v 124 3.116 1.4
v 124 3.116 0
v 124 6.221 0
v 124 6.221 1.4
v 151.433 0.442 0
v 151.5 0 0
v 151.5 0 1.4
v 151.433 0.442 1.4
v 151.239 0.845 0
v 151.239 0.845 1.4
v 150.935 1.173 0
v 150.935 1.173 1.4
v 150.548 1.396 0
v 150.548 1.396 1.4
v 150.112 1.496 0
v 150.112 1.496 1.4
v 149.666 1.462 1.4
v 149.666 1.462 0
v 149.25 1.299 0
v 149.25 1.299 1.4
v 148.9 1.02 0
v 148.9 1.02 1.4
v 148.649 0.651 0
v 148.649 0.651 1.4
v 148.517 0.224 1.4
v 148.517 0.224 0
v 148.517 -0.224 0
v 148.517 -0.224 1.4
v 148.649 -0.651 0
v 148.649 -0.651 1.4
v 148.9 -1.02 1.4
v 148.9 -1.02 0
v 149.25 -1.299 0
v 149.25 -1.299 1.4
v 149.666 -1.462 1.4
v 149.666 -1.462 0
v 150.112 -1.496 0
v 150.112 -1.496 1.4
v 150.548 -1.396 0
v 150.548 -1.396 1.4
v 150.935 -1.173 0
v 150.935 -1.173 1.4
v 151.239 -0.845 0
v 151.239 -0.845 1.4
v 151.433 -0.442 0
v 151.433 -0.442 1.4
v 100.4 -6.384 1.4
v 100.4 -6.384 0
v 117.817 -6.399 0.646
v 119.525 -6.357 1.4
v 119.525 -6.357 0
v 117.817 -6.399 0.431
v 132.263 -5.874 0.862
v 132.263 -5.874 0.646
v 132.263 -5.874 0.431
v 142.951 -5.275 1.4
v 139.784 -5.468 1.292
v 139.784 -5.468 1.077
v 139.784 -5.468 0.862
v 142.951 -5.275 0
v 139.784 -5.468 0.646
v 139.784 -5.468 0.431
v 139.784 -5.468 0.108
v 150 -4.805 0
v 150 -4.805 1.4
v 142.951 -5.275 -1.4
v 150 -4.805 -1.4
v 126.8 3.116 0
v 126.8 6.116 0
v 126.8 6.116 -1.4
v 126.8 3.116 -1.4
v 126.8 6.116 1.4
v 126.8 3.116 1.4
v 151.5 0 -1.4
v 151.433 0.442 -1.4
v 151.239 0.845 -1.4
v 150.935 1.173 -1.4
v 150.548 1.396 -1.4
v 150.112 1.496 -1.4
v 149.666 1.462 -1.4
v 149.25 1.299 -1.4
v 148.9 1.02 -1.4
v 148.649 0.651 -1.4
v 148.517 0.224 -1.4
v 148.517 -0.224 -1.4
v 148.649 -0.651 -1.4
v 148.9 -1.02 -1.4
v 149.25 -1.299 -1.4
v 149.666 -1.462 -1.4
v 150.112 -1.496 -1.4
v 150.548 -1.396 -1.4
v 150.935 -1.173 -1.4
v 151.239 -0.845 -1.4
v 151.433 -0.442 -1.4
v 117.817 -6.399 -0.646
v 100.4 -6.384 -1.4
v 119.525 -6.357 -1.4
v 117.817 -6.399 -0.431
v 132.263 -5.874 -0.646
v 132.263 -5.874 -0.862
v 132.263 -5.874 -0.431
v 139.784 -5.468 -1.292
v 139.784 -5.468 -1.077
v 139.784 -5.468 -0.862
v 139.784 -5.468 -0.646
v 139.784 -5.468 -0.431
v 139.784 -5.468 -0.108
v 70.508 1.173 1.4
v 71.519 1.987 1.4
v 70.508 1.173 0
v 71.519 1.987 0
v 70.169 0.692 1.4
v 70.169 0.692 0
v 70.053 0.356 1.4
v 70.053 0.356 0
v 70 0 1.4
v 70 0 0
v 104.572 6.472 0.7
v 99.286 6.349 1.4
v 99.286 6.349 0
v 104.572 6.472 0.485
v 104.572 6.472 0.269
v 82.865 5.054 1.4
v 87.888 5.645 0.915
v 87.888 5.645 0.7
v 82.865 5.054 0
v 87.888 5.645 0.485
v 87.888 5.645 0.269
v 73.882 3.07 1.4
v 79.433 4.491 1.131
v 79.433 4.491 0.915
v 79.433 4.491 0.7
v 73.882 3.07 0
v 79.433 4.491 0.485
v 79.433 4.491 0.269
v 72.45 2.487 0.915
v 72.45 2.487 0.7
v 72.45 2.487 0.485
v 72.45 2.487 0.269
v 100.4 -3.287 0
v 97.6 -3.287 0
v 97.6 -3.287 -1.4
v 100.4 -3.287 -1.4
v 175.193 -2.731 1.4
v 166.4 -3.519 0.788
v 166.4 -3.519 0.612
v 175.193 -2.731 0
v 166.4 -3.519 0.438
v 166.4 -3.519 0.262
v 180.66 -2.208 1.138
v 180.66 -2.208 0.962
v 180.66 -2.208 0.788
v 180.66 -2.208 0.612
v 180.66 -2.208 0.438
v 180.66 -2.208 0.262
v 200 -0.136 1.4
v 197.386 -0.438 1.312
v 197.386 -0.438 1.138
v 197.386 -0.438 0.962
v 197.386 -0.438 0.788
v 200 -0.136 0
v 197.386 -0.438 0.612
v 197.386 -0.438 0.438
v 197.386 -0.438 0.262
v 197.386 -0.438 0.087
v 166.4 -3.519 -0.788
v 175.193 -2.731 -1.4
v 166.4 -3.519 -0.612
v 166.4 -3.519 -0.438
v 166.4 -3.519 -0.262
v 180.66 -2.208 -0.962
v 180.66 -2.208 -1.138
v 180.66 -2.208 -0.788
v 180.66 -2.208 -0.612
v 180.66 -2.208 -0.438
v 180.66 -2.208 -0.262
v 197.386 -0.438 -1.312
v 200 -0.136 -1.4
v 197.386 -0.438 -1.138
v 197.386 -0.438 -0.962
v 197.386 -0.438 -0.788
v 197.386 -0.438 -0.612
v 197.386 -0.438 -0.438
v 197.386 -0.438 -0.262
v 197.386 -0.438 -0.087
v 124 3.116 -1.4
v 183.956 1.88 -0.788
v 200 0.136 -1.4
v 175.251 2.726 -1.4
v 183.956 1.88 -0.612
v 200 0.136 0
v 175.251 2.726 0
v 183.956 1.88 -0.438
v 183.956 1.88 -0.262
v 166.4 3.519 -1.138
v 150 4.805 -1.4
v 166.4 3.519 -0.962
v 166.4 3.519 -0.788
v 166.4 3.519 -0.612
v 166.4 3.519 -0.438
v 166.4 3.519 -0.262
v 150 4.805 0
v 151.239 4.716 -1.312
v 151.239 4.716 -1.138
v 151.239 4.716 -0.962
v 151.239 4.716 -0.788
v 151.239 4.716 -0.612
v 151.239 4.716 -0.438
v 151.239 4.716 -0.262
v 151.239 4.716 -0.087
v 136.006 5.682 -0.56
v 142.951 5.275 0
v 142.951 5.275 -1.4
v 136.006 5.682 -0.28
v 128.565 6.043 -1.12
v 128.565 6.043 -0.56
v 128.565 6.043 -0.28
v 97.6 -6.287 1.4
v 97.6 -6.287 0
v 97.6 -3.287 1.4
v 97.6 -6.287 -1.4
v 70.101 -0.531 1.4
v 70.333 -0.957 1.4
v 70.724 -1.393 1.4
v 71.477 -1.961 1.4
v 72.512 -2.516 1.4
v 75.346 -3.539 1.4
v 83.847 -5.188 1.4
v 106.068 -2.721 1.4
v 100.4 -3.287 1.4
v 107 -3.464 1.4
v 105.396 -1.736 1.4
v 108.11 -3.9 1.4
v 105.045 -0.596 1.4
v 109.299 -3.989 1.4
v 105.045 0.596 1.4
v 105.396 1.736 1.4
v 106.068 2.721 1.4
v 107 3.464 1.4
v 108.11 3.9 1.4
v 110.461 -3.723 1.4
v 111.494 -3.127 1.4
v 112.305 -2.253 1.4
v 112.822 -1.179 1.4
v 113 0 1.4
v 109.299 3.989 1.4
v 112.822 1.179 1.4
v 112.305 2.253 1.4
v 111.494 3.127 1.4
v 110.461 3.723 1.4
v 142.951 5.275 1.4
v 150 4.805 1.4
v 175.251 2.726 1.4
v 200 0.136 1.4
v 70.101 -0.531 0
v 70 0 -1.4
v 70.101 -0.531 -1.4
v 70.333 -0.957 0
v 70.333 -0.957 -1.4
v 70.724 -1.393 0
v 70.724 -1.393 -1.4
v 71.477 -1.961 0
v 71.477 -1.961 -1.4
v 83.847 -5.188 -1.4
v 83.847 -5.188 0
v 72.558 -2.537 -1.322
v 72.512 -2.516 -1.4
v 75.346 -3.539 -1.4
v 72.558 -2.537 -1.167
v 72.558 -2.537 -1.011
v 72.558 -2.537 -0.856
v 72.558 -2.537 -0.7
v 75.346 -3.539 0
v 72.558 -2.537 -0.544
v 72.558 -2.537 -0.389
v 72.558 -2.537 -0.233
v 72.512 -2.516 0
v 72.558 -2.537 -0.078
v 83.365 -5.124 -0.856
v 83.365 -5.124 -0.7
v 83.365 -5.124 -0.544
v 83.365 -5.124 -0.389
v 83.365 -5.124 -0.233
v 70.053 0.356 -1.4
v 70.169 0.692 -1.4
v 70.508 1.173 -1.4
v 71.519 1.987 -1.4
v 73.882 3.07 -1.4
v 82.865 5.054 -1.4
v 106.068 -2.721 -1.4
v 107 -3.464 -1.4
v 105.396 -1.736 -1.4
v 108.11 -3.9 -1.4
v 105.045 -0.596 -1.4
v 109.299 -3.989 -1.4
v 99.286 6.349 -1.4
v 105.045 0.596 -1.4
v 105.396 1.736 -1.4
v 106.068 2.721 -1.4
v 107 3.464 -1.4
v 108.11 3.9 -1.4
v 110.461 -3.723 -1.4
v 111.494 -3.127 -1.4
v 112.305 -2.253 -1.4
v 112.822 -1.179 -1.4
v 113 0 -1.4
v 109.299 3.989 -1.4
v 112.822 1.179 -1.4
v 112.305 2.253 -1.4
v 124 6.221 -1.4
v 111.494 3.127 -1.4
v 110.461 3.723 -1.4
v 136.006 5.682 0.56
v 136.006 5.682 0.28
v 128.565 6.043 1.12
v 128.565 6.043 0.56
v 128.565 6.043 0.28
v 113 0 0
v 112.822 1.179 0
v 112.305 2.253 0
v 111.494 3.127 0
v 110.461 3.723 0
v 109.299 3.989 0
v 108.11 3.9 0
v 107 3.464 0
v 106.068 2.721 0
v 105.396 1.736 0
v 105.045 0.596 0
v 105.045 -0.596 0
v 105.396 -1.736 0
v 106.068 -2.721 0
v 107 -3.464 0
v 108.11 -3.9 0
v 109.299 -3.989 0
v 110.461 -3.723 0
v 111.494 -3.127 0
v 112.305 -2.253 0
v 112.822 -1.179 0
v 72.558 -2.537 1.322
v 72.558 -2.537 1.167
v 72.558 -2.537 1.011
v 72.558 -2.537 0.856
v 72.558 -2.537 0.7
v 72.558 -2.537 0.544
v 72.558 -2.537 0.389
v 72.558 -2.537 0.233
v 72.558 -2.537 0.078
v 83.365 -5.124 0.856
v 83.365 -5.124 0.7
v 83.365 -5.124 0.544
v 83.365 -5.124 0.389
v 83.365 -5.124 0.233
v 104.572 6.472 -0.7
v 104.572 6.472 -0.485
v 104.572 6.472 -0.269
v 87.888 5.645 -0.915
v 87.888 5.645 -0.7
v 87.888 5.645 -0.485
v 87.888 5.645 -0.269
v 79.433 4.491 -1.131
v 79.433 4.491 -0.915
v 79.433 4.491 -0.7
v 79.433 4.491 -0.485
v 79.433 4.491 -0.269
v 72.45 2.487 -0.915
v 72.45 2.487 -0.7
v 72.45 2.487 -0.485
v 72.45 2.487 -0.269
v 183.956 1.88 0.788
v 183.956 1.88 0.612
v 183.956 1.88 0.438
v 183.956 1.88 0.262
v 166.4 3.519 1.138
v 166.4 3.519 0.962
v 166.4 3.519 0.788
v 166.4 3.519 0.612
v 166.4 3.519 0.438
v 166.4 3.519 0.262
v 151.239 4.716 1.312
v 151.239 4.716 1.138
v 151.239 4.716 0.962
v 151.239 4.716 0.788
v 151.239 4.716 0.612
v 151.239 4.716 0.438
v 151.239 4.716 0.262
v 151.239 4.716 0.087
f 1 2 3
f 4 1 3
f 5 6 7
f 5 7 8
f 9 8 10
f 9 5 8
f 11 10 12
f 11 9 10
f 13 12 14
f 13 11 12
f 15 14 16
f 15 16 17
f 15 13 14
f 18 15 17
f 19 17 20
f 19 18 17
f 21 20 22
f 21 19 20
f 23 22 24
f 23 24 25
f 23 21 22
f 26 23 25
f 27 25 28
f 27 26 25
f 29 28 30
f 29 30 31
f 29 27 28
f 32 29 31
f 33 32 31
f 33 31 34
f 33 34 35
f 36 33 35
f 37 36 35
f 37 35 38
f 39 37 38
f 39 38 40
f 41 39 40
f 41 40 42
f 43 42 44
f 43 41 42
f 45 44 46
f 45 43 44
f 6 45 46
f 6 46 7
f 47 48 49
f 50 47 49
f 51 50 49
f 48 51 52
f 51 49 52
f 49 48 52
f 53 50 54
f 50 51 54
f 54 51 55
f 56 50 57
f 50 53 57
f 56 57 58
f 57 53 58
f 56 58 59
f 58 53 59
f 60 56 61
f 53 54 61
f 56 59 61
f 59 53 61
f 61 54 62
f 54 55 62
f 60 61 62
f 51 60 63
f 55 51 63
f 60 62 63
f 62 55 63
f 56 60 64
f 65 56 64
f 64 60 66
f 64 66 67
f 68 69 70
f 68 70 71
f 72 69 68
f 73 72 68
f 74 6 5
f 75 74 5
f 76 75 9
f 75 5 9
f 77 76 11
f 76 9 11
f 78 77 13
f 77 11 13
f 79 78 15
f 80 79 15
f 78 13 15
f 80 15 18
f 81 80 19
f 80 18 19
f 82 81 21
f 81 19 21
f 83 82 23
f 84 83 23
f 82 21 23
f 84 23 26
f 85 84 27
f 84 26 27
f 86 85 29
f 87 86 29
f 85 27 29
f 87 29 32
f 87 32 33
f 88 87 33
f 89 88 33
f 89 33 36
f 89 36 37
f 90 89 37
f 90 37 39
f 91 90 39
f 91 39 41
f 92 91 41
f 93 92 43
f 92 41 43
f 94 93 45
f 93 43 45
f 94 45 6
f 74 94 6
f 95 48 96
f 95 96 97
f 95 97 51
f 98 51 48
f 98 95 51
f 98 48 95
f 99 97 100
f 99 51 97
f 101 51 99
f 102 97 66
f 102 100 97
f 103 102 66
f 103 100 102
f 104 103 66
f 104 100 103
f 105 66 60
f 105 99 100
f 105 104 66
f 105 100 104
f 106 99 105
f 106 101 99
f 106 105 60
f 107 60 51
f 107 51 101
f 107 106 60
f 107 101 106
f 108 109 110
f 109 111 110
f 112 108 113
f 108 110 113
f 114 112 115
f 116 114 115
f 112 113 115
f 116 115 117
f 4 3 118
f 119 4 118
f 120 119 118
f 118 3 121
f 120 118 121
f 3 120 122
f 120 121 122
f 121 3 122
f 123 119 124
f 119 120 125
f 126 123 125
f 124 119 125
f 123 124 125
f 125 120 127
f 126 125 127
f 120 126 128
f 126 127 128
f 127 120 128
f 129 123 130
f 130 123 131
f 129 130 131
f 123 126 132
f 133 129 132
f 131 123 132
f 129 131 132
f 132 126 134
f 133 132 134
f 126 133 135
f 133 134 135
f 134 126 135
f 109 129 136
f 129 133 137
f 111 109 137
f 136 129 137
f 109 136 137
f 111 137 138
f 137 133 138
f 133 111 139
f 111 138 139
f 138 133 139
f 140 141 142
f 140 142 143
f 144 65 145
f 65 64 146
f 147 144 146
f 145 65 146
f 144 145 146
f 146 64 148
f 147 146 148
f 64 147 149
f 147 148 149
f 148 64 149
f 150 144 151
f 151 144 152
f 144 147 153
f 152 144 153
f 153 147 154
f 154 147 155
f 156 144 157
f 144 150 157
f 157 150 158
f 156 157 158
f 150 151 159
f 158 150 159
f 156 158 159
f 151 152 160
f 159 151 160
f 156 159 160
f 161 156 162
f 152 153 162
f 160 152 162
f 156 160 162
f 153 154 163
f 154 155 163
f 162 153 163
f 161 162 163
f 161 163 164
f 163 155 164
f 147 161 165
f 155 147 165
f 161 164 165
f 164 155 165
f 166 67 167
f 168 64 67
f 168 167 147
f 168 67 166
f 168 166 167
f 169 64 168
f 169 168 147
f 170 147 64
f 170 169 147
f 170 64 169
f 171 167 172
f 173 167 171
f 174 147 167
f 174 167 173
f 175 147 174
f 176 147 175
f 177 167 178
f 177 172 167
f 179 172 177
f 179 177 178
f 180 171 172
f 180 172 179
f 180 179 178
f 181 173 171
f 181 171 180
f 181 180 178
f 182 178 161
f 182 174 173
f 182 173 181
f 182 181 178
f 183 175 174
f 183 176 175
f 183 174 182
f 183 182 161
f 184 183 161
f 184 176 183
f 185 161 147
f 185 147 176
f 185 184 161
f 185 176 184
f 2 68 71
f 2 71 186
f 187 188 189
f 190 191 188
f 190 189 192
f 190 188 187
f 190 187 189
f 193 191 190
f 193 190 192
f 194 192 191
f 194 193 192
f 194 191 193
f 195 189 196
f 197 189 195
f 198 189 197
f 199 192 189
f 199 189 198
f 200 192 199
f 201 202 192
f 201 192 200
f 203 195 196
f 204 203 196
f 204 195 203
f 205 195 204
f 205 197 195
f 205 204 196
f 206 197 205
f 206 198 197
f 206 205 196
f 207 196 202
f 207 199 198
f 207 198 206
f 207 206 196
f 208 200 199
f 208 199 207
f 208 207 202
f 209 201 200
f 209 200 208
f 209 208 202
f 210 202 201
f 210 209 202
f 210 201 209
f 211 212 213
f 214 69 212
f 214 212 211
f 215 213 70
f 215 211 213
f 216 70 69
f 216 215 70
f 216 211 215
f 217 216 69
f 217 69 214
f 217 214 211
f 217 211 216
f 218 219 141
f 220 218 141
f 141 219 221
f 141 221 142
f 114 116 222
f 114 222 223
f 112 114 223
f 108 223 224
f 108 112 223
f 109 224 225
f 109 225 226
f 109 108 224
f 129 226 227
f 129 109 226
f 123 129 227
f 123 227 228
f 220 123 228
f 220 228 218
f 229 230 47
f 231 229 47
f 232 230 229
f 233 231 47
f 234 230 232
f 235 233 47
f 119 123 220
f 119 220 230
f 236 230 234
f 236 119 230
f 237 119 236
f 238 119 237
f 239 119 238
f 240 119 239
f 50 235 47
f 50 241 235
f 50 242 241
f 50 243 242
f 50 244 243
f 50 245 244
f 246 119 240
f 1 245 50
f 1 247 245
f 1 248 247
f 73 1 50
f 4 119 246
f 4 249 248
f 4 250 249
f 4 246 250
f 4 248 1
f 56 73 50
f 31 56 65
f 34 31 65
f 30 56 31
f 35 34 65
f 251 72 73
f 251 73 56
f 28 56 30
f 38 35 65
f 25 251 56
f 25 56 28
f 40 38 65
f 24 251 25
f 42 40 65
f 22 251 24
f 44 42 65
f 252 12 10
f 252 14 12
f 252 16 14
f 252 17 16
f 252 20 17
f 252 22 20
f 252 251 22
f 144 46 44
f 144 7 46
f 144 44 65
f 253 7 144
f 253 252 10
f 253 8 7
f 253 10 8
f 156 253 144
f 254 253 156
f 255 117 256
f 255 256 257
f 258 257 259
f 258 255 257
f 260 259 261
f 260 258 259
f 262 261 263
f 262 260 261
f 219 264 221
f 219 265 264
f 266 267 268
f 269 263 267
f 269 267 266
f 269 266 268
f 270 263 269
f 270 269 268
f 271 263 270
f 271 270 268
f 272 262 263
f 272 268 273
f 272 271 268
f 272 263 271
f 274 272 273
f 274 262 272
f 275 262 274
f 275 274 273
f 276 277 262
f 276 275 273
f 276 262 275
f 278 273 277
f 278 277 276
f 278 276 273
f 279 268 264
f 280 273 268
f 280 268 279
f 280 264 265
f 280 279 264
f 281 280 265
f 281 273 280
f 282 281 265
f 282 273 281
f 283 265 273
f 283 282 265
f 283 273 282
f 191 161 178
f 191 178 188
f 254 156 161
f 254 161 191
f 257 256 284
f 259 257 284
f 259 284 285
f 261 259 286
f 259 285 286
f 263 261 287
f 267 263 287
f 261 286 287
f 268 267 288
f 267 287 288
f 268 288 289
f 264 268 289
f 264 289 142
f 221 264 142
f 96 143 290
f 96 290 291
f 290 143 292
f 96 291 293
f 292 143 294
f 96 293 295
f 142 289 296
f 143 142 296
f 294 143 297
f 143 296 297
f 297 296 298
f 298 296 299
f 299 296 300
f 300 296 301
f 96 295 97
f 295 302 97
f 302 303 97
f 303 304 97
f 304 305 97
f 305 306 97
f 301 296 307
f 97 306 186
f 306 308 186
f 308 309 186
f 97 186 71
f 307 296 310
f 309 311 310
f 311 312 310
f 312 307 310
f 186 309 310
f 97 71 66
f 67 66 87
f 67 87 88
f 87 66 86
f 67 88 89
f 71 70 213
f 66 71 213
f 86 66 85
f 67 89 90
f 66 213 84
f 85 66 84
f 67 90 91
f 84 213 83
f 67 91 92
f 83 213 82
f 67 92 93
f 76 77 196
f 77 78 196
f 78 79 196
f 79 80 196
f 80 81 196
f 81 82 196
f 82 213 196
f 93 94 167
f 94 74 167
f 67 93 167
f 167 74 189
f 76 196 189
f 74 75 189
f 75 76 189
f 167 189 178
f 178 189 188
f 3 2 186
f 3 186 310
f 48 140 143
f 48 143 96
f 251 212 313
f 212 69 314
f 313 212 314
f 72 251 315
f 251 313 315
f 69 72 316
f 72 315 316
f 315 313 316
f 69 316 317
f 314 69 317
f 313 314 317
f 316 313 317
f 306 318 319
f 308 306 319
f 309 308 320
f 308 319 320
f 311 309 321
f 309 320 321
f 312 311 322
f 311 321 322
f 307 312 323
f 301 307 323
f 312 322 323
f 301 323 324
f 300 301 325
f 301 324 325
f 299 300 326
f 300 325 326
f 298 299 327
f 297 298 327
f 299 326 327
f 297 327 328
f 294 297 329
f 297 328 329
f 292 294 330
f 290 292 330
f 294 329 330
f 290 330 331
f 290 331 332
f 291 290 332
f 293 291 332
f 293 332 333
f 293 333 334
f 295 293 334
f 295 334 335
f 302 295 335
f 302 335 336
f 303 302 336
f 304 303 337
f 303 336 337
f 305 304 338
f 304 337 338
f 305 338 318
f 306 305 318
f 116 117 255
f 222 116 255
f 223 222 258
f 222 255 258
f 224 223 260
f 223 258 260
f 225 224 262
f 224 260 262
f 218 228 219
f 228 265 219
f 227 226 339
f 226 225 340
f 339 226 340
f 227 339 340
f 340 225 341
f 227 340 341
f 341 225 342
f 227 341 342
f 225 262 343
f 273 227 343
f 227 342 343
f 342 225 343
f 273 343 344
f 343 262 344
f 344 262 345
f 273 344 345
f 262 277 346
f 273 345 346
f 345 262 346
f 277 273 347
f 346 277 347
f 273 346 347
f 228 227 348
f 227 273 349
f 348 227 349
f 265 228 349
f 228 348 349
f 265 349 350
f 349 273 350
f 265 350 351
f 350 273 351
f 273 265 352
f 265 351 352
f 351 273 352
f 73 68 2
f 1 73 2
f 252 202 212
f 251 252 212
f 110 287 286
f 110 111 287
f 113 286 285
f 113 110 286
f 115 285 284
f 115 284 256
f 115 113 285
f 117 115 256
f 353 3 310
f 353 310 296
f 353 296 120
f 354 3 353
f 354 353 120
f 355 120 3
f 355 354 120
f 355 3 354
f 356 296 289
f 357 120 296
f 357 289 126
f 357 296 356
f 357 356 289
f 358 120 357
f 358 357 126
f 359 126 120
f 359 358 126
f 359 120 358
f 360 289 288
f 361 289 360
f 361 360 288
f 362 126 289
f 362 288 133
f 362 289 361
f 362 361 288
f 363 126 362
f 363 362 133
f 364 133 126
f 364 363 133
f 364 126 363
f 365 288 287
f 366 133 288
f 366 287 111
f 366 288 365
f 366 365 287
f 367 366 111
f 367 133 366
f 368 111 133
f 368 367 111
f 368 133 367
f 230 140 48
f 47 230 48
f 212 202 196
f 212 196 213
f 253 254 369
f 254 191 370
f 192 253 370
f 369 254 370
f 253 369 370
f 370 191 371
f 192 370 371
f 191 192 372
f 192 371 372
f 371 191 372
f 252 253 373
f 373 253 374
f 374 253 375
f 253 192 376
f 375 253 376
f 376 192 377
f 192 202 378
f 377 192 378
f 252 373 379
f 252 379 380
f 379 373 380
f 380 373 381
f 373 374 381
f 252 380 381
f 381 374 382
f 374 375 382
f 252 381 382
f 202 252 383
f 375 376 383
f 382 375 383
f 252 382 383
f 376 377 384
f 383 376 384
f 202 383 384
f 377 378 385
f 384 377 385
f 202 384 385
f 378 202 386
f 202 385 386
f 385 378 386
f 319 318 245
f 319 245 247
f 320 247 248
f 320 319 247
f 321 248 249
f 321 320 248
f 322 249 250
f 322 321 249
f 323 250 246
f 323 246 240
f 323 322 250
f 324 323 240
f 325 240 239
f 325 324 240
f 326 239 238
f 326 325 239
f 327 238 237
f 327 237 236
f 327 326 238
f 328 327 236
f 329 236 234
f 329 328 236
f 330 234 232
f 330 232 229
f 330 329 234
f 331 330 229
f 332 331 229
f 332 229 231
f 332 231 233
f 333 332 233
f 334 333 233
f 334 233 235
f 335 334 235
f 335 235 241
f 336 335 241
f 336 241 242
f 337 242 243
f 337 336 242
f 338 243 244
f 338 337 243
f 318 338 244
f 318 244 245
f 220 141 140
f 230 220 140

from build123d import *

# Parameters (mm, degrees)
SKETCH_1_R      = 4
SKETCH_1_R_2    = 1.5
EXTRUDE_1_DEPTH = 1.4


with BuildPart() as part:
    # Эскиз1 → Бобышка-Вытянуть1 (new, symmetric)
    # profile 1 of 3: a face of its own
    with BuildSketch(Plane.XY):
        with BuildLine():
            ThreePointArc((142.9506924, -5.275271304), (141.195386154, 0), (142.9506924, 5.275271304))
            add(Edge.make_bspline(
                [(142.9506924, 5.275271304), (141.895273265, 5.341555985), (139.58067118, 5.482611203), (136.018308787, 5.684139375), (132.278649951, 5.876462218), (129.209784139, 6.017194243), (127.3884169, 6.092546027), (126.8, 6.115995161)],
                knots=[0.434385904, 0.434385904, 0.434385904, 0.434385904, 0.458441906, 0.487136113, 0.515551917, 0.543623846, 0.557019782, 0.557019782, 0.557019782, 0.557019782], degree=3))
            Line((126.8, 6.115995161), (126.8, 3.115995161))
            Line((126.8, 3.115995161), (124, 3.115995161))
            Line((124, 3.115995161), (124, 6.220663768))
            add(Edge.make_bspline(
                [(124, 6.220663768), (123.11146317, 6.251630223), (121.050662796, 6.318359671), (117.842409031, 6.402489725), (114.402873354, 6.466317507), (111.045700994, 6.50076677), (107.777727309, 6.504988151), (104.605571578, 6.478227912), (101.535643119, 6.420092882), (98.574171232, 6.330224571), (95.72720364, 6.20862837), (93.000627425, 6.055460368), (90.400165433, 5.871109356), (87.93140692, 5.6561322), (85.599787172, 5.411383296), (83.410617303, 5.137791437), (81.369070337, 4.836509353), (79.480180392, 4.50879808), (77.748848327, 4.156021599), (76.179826925, 3.779610549), (74.777626787, 3.381064766), (73.546659786, 2.961752121), (72.490485221, 2.523001182), (71.613403941, 2.065704885), (70.914845437, 1.589483413), (70.405465138, 1.091288639), (70.065411578, 0.561470169), (70.021089193, 0.181022278), (70, 0)],
                knots=[0.578266104, 0.578266104, 0.578266104, 0.578266104, 0.59849081, 0.625169613, 0.651272029, 0.676746158, 0.701541791, 0.725611017, 0.748907835, 0.771387785, 0.793008139, 0.813728033, 0.833507815, 0.852309696, 0.87009731, 0.886835918, 0.902492782, 0.917037139, 0.930441054, 0.942679762, 0.953733567, 0.963589785, 0.972247019, 0.979722225, 0.986065145, 0.991385258, 0.995900989, 1, 1, 1, 1], degree=3))
            add(Edge.make_bspline(
                [(70, 0), (70.021089193, -0.181022278), (70.065411578, -0.561470169), (70.405465138, -1.091288639), (70.914845437, -1.589483413), (71.613403941, -2.065704885), (72.490485221, -2.523001182), (73.546659786, -2.961752121), (74.777626787, -3.381064766), (76.179826925, -3.779610549), (77.748848327, -4.156021599), (79.480180392, -4.50879808), (81.369070337, -4.836509353), (83.410617303, -5.137791437), (85.599787172, -5.411383296), (87.93140692, -5.6561322), (90.400165433, -5.871109356), (93.000627425, -6.055460368), (95.41524555, -6.191103829), (96.962536517, -6.260685275), (97.6, -6.286643263)],
                knots=[0, 0, 0, 0, 0.004099011, 0.008614742, 0.013934855, 0.020277775, 0.027752981, 0.036410215, 0.046266433, 0.057320238, 0.069558946, 0.082962861, 0.097507218, 0.113164082, 0.12990269, 0.147690304, 0.166492185, 0.186271967, 0.206991861, 0.221504823, 0.221504823, 0.221504823, 0.221504823], degree=3))
            Line((97.6, -6.286643263), (97.6, -3.286643263))
            Line((97.6, -3.286643263), (100.4, -3.286643263))
            Line((100.4, -3.286643263), (100.4, -6.38393598))
            add(Edge.make_bspline(
                [(100.4, -6.38393598), (100.766606381, -6.394566581), (102.157000483, -6.431859484), (104.605571578, -6.478227912), (107.777727309, -6.504988151), (111.045700994, -6.50076677), (114.402873354, -6.466317507), (117.842409031, -6.402489725), (121.357229156, -6.31032058), (124.940008831, -6.191027083), (128.583123626, -6.045931636), (132.278649951, -5.876462218), (136.018308787, -5.684139375), (139.58067118, -5.482611203), (141.895273265, -5.341555985), (142.9506924, -5.275271304)],
                knots=[0.242749132, 0.242749132, 0.242749132, 0.242749132, 0.251092165, 0.274388983, 0.298458209, 0.323253842, 0.348727971, 0.374830387, 0.40150919, 0.428710016, 0.456376154, 0.484448083, 0.512863887, 0.541558094, 0.565614096, 0.565614096, 0.565614096, 0.565614096], degree=3))
        make_face()
        with Locations((109, 0)):
            Circle(SKETCH_1_R, mode=Mode.SUBTRACT)
    # profile 2 of 3: a face of its own
    with BuildSketch(Plane.XY):
        with BuildLine():
            ThreePointArc((150, -4.804613846), (145.195386154, 0), (150, 4.804613846))
            add(Edge.make_bspline(
                [(150, 4.804613846), (149.136945561, 4.865512022), (147.000177515, 5.013425176), (144.650242252, 5.167974314), (143.163400263, 5.261912372), (142.9506924, 5.275271304)],
                knots=[0.380814152, 0.380814152, 0.380814152, 0.380814152, 0.400495752, 0.429537687, 0.434385904, 0.434385904, 0.434385904, 0.434385904], degree=3))
            ThreePointArc((142.9506924, 5.275271304), (141.195386154, 0), (142.9506924, -5.275271304))
            add(Edge.make_bspline(
                [(142.9506924, -5.275271304), (143.163400263, -5.261912372), (144.650242252, -5.167974314), (147.000177515, -5.013425176), (149.136945561, -4.865512022), (150, -4.804613846)],
                knots=[0.565614096, 0.565614096, 0.565614096, 0.565614096, 0.570462313, 0.599504248, 0.619185848, 0.619185848, 0.619185848, 0.619185848], degree=3))
        make_face()
    # profile 3 of 3: a face of its own
    with BuildSketch(Plane.XY):
        with BuildLine():
            Line((200, -0.1365), (200, 0.1365))
            add(Edge.make_bspline(
                [(200, 0.1365), (199.68803342, 0.172881569), (198.81669122, 0.27449757), (197.235914613, 0.456098486), (195.145010046, 0.692291497), (192.701519493, 0.962451868), (189.981579718, 1.256111468), (187.036509642, 1.566007991), (183.904963565, 1.886673282), (179.441732645, 2.330723386), (174.819068239, 2.769921708), (170.064960651, 3.20022732), (166.382173561, 3.522091337), (162.644406173, 3.836797902), (158.865943793, 4.14237985), (155.059961592, 4.437010481), (152.101523013, 4.655245952), (150.413140573, 4.775462142), (150, 4.804613846)],
                knots=[0, 0, 0, 0, 0.007144724, 0.019955661, 0.036196061, 0.055011184, 0.075878938, 0.098428866, 0.122375554, 0.147487885, 0.200459747, 0.22800517, 0.256076454, 0.284555151, 0.313332763, 0.342309554, 0.371392651, 0.380814152, 0.380814152, 0.380814152, 0.380814152], degree=3))
            ThreePointArc((150, 4.804613846), (145.195386154, 0), (150, -4.804613846))
            add(Edge.make_bspline(
                [(150, -4.804613846), (150.413140573, -4.775462142), (152.101523013, -4.655245952), (155.059961592, -4.437010481), (158.865943793, -4.14237985), (162.644406173, -3.836797902), (166.382173561, -3.522091337), (170.064960651, -3.20022732), (174.819068239, -2.769921708), (179.441732645, -2.330723386), (183.904963565, -1.886673282), (187.036509642, -1.566007991), (189.981579718, -1.256111468), (192.701519493, -0.962451868), (195.145010046, -0.692291497), (197.235914613, -0.456098486), (198.81669122, -0.27449757), (199.68803342, -0.172881569), (200, -0.1365)],
                knots=[0.619185848, 0.619185848, 0.619185848, 0.619185848, 0.628607349, 0.657690446, 0.686667237, 0.715444849, 0.743923546, 0.77199483, 0.799540253, 0.852512115, 0.877624446, 0.901571134, 0.924121062, 0.944988816, 0.963803939, 0.980044339, 0.992855276, 1, 1, 1, 1], degree=3))
        make_face()
        with Locations((150, 0)):
            Circle(SKETCH_1_R_2, mode=Mode.SUBTRACT)
    extrude(amount=EXTRUDE_1_DEPTH, both=True)


solid = part.part
